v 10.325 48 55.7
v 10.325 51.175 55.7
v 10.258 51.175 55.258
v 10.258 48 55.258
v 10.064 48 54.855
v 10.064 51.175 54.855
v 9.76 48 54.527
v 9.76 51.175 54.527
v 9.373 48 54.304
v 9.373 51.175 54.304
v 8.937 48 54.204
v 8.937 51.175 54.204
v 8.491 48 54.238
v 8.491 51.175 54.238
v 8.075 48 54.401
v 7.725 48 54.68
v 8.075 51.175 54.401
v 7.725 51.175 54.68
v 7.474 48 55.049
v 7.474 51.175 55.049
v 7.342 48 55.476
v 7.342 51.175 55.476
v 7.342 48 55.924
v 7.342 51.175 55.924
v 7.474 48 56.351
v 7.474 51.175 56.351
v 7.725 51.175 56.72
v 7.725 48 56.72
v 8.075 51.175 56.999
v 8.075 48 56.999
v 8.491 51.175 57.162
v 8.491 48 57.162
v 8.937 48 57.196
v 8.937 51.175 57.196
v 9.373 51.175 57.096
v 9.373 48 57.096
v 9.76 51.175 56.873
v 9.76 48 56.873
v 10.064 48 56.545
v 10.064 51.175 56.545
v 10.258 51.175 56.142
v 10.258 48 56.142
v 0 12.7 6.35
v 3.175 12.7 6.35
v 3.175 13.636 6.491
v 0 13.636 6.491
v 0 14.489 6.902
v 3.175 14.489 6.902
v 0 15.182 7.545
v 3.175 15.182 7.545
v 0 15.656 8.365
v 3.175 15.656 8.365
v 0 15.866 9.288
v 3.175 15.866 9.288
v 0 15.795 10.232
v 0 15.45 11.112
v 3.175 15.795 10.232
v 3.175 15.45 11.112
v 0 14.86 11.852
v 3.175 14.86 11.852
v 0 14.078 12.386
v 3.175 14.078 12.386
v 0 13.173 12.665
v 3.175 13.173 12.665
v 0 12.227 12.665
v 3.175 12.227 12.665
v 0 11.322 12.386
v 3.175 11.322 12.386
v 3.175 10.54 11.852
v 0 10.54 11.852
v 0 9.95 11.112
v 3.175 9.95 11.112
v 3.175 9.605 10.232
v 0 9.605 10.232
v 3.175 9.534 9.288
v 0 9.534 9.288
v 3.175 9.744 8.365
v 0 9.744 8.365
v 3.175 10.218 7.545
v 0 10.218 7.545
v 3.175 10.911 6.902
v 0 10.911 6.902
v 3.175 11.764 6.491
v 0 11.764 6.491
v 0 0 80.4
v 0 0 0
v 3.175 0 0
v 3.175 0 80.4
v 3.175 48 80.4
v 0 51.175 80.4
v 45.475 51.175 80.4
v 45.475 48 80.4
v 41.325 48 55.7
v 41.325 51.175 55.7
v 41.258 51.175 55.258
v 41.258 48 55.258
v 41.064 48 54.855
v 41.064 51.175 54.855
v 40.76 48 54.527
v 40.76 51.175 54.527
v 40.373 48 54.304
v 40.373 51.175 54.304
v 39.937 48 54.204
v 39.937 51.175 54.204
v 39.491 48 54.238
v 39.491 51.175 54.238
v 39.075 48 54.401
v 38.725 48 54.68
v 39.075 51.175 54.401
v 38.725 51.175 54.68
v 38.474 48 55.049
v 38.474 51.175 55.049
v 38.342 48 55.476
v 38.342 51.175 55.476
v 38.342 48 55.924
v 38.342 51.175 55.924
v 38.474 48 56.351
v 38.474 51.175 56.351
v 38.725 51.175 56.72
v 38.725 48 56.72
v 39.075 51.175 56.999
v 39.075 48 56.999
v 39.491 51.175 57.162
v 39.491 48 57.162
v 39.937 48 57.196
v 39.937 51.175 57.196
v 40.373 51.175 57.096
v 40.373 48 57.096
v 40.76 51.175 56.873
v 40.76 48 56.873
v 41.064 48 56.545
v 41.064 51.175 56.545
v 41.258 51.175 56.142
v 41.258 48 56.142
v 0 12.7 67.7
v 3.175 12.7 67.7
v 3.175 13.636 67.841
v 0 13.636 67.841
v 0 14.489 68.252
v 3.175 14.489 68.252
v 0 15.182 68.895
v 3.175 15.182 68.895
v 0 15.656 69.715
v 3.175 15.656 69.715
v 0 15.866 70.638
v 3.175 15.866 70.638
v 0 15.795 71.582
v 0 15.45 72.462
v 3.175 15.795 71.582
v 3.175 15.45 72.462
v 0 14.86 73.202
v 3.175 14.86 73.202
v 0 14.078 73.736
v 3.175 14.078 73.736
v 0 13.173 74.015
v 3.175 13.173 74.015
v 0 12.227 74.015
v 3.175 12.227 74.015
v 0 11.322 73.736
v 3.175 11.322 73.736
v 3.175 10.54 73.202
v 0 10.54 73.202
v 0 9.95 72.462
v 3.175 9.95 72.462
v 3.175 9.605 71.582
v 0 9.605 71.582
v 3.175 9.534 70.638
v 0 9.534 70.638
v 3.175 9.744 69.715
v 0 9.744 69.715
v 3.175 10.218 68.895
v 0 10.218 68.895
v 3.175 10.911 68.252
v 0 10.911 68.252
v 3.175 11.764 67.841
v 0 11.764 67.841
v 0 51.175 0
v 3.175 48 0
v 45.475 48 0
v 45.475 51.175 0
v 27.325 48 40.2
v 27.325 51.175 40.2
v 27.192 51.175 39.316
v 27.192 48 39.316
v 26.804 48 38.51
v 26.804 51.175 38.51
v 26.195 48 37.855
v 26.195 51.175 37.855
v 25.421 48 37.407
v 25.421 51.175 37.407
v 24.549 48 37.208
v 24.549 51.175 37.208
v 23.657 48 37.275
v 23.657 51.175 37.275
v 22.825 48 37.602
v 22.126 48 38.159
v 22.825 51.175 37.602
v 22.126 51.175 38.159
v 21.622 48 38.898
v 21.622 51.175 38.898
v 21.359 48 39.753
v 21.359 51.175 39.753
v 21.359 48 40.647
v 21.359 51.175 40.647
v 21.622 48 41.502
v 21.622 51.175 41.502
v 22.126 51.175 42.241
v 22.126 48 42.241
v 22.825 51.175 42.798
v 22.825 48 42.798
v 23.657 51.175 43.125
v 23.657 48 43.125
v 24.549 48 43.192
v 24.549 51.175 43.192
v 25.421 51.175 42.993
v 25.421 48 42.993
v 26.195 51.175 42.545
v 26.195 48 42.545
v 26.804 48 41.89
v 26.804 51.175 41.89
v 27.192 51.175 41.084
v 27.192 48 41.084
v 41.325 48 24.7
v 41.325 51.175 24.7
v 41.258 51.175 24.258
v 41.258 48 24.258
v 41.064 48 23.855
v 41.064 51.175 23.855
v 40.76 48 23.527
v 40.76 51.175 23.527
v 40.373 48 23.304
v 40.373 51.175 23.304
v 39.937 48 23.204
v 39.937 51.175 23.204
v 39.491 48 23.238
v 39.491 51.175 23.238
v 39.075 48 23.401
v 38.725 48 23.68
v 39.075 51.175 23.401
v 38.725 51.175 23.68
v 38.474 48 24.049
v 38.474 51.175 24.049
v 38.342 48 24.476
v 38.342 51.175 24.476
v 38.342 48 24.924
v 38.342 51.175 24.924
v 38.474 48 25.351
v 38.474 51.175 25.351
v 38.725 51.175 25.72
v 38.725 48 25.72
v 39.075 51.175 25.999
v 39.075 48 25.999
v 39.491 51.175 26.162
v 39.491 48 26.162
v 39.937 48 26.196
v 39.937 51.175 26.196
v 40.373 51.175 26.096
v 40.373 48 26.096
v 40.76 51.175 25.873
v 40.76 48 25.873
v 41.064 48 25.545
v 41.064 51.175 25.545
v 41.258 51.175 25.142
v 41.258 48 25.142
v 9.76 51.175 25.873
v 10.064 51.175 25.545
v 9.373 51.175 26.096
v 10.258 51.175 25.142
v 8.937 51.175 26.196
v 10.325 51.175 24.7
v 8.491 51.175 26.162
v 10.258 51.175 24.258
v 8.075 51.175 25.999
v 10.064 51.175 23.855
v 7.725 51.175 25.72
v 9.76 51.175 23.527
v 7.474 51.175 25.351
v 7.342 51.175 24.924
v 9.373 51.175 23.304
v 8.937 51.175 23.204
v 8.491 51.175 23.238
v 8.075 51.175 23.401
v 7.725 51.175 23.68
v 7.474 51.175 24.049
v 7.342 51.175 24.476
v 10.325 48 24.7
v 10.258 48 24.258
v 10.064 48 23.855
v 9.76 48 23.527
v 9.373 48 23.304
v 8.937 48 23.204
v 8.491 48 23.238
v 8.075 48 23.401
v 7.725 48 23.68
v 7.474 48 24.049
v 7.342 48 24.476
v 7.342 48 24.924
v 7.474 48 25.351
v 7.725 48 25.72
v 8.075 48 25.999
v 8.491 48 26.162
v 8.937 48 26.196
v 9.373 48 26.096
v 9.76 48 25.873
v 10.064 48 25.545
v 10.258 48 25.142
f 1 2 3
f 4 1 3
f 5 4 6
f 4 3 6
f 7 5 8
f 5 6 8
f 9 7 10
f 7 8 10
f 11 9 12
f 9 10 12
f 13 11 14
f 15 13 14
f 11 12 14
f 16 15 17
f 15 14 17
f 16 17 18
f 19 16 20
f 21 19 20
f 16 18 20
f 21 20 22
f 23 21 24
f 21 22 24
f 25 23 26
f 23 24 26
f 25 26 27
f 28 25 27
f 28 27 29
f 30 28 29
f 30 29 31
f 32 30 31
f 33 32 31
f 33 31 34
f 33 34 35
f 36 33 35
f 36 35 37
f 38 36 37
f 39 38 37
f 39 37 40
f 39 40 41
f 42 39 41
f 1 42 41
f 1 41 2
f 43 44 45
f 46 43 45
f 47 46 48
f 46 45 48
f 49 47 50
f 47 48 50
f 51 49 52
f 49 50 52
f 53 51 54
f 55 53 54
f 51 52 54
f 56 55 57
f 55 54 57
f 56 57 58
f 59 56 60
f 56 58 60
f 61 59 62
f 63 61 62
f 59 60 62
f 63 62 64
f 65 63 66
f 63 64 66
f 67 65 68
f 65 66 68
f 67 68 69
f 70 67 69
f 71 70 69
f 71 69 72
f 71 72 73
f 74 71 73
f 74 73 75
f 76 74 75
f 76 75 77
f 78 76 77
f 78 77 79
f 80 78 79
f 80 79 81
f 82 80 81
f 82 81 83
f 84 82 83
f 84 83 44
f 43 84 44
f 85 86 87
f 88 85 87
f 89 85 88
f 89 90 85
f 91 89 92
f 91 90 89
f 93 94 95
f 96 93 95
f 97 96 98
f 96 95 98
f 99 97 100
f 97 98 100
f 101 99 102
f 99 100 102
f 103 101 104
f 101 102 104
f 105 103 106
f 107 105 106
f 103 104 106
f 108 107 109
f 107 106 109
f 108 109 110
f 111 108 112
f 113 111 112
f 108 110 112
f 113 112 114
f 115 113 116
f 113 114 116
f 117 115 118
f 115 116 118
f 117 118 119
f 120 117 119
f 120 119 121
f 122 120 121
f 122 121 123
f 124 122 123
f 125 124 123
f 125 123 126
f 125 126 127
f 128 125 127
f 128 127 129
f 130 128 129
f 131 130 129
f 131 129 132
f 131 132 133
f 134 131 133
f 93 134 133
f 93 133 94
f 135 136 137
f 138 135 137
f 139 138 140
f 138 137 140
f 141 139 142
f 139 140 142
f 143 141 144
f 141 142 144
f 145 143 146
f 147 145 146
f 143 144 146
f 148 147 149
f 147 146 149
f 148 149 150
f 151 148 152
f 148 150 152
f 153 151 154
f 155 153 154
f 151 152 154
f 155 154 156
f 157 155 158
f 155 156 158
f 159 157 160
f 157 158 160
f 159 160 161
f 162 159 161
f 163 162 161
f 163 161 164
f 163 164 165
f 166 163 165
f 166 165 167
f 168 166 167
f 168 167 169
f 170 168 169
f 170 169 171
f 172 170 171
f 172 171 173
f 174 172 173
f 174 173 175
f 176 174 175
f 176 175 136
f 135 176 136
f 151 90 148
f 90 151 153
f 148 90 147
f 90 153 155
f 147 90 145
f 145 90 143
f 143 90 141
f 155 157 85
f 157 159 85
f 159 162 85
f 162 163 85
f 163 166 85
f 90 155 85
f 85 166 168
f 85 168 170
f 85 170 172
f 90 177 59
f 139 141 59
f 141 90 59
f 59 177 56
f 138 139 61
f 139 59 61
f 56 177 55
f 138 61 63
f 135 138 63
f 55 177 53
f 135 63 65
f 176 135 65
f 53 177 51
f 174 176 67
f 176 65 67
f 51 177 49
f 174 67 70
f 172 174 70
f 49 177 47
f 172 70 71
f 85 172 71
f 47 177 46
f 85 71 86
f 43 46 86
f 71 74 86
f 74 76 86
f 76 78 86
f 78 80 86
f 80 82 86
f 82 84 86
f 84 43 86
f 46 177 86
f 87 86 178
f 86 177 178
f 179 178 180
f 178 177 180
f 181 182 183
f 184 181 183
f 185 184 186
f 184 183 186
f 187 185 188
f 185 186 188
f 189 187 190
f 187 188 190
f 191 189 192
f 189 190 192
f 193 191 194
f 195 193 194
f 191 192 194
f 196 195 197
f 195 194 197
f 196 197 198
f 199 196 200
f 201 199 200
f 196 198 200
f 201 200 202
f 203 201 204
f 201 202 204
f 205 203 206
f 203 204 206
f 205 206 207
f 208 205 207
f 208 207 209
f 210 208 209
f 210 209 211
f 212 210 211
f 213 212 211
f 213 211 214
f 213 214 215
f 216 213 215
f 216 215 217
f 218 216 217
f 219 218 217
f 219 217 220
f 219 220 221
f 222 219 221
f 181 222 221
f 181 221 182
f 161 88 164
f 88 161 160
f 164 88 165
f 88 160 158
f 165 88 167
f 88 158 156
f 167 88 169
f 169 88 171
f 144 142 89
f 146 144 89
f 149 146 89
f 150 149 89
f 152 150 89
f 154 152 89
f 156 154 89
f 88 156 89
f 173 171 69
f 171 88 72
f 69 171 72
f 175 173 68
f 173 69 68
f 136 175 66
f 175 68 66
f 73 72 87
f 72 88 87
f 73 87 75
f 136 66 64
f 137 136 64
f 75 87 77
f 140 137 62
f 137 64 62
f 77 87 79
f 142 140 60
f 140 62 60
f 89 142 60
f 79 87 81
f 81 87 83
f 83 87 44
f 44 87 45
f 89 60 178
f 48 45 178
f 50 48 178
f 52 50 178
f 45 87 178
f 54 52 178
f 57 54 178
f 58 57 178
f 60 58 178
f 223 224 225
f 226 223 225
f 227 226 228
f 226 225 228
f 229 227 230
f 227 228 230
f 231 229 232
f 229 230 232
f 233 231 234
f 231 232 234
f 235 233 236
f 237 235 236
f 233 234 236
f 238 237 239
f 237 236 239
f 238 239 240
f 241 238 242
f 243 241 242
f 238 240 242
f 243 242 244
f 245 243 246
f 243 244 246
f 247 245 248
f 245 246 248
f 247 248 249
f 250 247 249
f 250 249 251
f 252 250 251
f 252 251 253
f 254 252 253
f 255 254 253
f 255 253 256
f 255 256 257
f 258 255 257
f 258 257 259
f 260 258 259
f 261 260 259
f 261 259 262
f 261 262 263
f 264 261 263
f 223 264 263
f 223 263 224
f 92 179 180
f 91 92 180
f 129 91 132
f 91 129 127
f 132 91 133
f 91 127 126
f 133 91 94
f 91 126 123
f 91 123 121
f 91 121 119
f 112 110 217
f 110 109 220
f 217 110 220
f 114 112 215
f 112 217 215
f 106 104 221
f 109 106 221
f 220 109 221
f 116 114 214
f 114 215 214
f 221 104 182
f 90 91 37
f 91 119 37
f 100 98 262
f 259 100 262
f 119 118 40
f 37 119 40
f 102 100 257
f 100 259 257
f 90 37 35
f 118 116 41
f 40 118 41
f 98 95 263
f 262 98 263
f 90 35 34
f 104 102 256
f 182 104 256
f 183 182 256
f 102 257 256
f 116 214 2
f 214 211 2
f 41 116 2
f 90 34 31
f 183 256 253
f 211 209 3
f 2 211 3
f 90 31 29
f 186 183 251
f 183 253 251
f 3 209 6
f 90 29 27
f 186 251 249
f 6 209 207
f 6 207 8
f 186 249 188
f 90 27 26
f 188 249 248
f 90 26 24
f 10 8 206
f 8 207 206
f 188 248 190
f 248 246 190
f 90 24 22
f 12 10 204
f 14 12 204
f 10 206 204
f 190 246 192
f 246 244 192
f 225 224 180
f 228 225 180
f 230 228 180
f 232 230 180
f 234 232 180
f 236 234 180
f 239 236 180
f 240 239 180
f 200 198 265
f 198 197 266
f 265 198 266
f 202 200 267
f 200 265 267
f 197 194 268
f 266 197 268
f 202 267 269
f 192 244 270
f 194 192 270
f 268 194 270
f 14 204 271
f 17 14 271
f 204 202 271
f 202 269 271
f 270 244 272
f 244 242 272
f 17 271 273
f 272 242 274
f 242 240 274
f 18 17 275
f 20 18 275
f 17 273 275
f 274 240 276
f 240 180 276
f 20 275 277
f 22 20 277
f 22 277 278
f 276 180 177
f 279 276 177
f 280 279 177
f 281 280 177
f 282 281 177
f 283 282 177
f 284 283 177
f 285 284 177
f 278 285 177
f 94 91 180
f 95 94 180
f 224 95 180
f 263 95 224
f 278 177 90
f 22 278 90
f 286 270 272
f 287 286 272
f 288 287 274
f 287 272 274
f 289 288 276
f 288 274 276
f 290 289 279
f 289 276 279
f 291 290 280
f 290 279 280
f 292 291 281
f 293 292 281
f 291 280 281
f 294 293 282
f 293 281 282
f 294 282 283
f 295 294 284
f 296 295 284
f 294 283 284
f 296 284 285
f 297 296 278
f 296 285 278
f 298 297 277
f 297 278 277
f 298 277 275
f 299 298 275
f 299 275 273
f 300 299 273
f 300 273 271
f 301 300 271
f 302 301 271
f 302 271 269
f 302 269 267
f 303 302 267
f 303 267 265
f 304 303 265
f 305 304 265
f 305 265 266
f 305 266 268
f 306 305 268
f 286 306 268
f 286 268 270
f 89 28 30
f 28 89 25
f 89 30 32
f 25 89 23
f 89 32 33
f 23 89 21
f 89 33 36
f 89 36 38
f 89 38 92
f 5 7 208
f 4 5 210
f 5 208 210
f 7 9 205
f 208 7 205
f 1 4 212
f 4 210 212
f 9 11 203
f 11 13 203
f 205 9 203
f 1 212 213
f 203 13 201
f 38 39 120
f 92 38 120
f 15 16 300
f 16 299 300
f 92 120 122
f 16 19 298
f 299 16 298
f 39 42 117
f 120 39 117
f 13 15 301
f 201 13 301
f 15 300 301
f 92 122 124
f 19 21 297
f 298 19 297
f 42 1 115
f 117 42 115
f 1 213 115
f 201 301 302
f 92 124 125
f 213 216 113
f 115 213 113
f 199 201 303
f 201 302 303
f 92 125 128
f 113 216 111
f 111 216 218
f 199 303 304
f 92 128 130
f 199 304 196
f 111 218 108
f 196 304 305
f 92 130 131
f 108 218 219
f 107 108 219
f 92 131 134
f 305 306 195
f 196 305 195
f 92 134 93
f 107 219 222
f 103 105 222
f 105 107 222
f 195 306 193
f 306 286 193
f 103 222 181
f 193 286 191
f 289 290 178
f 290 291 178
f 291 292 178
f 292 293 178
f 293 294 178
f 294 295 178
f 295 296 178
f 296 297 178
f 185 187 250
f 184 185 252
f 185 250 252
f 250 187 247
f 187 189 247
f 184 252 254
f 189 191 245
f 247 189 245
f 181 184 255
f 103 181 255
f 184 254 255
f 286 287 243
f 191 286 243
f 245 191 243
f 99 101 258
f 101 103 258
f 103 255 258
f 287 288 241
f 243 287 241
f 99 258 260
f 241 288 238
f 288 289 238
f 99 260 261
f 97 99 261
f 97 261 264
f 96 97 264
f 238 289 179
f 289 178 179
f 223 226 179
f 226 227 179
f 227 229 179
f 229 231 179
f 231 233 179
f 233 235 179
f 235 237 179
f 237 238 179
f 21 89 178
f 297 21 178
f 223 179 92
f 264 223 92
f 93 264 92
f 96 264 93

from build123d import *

# Parameters (mm, degrees)
BOSS_EXTRUDE1_DEPTH = 80.4
SKETCH2_R           = 3.175
CUT_EXTRUDE1_DEPTH  = 4.175
SKETCH3_R           = 1.5
SKETCH3_R_2         = 3
CUT_EXTRUDE2_DEPTH  = 52.175


with BuildPart() as part:
    # Sketch1 → Boss-Extrude1 (new body)
    with BuildSketch(Plane.XY):
        Polygon((0, 0), (3.175, 0), (3.175, 48), (45.475, 48), (45.475, 51.175), (0, 51.175), align=None)
    extrude(amount=BOSS_EXTRUDE1_DEPTH)

    # Sketch2 → Cut-Extrude1 (cut, through all)
    with BuildSketch(Plane(origin=(3.175, 0, 0), x_dir=(0, 0, -1), z_dir=(1, 0, 0))):
        with Locations((-70.875, 12.7)):
            Circle(SKETCH2_R)
        with Locations((-9.525, 12.7)):
            Circle(SKETCH2_R)
    extrude(amount=-CUT_EXTRUDE1_DEPTH, mode=Mode.SUBTRACT)

    # Sketch3 → Cut-Extrude2 (cut, through all)
    with BuildSketch(Plane(origin=(0, 51.175, 0), x_dir=(1, 0, 0), z_dir=(0, 1, 0))):
        with Locations((39.825, -55.7)):
            Circle(SKETCH3_R)
        with Locations((8.825, -55.7)):
            Circle(SKETCH3_R)
        with Locations((8.825, -24.7)):
            Circle(SKETCH3_R)
        with Locations((39.825, -24.7)):
            Circle(SKETCH3_R)
        with Locations((24.325, -40.2)):
            Circle(SKETCH3_R_2)
    extrude(amount=-CUT_EXTRUDE2_DEPTH, mode=Mode.SUBTRACT)


solid = part.part
